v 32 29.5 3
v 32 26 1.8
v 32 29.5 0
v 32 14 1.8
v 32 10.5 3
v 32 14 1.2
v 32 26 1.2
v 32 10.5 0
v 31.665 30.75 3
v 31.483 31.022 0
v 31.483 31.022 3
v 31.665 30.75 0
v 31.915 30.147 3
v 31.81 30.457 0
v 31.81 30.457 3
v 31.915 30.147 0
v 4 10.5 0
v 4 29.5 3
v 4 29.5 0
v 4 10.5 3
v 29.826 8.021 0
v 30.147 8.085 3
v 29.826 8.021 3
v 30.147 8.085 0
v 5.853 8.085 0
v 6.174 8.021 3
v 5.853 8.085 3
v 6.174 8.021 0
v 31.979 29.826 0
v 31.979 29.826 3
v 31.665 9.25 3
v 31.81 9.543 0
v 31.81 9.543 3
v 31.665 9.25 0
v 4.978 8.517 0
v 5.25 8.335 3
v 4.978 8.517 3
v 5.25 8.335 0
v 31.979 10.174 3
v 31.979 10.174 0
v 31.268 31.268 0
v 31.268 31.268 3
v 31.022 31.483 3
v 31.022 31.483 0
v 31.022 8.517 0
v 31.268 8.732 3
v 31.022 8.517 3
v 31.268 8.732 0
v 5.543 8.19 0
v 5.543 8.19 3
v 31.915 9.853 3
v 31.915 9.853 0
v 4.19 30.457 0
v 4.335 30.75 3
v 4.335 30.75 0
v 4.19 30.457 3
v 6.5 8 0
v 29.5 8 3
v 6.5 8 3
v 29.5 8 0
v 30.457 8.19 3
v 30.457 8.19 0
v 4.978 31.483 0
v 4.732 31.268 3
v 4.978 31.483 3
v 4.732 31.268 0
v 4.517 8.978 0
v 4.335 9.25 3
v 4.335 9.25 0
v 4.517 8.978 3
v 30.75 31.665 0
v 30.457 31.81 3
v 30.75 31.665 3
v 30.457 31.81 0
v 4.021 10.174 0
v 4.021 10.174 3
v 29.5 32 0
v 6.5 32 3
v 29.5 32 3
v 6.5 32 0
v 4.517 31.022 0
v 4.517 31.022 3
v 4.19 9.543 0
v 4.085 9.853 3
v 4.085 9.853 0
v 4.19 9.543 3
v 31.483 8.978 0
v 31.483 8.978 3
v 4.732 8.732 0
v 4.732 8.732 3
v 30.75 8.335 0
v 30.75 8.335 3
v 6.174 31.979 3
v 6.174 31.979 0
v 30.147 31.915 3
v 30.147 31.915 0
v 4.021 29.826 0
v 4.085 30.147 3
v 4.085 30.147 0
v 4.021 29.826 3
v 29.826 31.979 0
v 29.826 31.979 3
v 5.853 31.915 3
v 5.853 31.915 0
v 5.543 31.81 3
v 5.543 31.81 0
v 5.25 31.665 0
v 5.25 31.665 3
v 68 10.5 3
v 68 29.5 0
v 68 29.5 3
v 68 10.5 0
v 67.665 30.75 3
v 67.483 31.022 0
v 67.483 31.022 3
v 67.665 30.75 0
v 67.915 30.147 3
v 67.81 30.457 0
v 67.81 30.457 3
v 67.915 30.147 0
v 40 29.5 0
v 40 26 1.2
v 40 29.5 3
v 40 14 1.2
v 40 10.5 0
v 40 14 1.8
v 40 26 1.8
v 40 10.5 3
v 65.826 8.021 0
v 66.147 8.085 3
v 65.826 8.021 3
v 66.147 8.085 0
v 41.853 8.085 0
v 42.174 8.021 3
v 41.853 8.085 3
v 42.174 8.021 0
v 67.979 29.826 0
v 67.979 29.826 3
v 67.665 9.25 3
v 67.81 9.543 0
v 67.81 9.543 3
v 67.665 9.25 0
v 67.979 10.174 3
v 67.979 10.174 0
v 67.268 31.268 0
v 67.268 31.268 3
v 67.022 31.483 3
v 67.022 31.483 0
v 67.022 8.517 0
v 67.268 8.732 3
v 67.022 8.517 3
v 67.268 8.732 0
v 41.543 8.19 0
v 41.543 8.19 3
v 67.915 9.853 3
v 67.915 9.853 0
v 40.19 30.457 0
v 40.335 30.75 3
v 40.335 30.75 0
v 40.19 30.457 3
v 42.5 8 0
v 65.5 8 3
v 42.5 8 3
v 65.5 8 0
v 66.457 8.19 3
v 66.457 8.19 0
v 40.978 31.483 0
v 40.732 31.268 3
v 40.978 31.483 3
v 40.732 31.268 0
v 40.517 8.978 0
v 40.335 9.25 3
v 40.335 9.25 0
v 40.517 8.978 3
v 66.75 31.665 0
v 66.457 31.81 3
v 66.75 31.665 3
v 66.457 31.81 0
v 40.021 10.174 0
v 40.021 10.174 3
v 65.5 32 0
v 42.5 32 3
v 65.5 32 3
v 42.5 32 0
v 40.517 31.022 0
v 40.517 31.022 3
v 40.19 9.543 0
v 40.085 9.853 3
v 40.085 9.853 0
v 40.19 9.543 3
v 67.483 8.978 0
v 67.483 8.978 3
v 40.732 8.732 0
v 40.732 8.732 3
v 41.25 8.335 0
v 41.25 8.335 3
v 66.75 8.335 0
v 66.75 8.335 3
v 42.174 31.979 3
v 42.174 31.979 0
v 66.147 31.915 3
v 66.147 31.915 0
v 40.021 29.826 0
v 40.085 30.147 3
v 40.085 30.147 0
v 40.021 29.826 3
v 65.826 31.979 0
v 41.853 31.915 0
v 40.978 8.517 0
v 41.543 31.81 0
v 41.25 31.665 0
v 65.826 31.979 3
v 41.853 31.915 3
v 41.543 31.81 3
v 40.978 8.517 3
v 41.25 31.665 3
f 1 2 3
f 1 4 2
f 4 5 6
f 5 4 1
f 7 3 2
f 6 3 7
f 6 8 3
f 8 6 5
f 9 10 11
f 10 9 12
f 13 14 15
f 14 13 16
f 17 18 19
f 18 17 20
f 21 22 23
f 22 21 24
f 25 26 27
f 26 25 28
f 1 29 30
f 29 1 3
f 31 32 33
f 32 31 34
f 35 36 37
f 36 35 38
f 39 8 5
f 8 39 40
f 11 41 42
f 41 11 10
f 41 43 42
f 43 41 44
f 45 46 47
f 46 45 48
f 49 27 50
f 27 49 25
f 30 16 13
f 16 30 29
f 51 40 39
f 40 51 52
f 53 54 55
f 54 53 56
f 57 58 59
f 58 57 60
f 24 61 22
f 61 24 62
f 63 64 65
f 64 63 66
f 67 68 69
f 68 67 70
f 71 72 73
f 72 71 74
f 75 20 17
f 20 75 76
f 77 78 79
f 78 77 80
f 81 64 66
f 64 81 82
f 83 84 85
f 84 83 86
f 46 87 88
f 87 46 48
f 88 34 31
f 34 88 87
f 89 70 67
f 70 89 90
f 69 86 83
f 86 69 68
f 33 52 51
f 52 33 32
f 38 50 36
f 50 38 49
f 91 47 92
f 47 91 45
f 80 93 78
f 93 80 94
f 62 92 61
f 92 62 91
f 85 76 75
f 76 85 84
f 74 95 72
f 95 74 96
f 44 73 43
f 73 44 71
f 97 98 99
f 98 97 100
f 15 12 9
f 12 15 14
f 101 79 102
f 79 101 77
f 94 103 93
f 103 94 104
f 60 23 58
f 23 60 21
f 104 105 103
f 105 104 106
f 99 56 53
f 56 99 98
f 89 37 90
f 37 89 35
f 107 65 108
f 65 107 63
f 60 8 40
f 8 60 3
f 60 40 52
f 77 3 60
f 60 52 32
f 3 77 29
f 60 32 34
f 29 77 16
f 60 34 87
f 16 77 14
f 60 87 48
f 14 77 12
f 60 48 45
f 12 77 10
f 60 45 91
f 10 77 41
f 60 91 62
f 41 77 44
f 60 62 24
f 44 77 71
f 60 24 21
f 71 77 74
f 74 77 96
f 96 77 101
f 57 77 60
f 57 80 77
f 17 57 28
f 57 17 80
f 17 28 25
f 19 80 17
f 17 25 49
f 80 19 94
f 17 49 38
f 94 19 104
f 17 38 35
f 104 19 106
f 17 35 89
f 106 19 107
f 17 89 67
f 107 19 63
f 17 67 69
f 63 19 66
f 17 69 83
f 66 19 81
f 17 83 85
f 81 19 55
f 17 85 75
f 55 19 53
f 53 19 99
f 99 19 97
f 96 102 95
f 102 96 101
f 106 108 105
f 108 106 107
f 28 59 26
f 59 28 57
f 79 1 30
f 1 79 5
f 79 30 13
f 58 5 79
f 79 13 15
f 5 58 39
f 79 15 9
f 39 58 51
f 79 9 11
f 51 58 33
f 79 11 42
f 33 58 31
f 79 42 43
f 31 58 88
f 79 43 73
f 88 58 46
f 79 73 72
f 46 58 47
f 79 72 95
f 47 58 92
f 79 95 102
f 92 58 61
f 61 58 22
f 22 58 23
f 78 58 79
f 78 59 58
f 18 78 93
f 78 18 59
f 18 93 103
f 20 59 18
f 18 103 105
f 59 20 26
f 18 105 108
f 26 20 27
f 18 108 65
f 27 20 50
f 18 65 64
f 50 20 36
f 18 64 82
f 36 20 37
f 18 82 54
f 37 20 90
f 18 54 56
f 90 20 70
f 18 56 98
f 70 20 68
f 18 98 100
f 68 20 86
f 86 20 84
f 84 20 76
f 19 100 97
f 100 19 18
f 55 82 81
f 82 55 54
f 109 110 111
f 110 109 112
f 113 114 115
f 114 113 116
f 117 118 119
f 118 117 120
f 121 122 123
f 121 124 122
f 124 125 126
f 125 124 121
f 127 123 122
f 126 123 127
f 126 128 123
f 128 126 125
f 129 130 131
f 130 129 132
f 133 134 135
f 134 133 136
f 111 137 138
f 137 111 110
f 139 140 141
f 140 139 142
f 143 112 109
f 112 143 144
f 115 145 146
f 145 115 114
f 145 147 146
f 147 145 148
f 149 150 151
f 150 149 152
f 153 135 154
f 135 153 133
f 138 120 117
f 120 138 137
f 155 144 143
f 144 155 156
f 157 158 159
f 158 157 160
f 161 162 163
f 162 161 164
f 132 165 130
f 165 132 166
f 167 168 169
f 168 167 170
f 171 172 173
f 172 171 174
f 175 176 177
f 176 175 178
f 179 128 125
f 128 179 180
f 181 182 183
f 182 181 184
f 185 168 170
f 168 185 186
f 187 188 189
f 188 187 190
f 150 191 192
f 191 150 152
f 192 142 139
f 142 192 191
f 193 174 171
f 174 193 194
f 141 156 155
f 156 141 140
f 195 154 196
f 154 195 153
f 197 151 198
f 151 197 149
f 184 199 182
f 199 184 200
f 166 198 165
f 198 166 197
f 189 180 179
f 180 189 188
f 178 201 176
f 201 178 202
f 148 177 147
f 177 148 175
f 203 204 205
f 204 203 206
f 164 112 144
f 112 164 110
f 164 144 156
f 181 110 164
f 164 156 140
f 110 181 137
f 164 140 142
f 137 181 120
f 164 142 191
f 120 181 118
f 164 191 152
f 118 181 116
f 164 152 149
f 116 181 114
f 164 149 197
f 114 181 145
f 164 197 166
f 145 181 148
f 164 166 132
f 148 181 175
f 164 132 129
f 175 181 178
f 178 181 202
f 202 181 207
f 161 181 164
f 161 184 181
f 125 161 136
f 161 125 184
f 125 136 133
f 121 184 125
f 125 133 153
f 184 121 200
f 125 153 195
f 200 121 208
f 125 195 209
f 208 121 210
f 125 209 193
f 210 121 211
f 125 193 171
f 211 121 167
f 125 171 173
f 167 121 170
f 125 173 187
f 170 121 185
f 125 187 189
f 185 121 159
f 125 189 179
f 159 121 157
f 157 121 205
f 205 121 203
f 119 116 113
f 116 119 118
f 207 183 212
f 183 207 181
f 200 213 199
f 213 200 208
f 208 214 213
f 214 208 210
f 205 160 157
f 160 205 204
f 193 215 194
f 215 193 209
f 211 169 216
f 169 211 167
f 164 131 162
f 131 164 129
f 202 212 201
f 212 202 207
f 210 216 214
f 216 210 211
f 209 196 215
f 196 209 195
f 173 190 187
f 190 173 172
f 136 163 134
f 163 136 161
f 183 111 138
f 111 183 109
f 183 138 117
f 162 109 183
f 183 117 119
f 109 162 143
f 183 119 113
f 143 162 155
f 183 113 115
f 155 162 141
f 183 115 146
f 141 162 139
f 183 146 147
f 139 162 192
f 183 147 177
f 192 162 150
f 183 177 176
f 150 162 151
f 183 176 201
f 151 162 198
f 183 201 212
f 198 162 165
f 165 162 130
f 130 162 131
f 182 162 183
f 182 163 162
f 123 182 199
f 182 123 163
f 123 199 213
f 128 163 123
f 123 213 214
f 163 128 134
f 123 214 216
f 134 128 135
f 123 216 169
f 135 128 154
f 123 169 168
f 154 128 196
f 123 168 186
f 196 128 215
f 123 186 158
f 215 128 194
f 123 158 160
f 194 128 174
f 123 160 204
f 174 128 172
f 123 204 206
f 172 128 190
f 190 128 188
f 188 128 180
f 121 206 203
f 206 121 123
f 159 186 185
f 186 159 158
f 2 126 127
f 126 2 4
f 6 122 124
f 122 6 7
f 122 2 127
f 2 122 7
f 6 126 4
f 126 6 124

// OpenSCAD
/*
Sample 009: Dünnsteg-Festkörpergelenk — weich 0,6 mm
Generated from the FDM Mechanical Sample Library.
Units: millimetres.

Override examples:
  openscad -o custom.stl -D 'view="plate"' -D 'render_fn=64' model.scad
  openscad -o preview.png -D 'view="assembly"' model.scad
*/
use <../../../library/fdm_mechanisms.scad>

render_fn = is_undef(render_fn) ? 48 : render_fn;
view = is_undef(view) ? "plate" : view;
$fn = render_fn;

sample_flexure_hinge(
    view=view,
    beam_t=0.6,
    beam_w=12,
    gap=8
);
